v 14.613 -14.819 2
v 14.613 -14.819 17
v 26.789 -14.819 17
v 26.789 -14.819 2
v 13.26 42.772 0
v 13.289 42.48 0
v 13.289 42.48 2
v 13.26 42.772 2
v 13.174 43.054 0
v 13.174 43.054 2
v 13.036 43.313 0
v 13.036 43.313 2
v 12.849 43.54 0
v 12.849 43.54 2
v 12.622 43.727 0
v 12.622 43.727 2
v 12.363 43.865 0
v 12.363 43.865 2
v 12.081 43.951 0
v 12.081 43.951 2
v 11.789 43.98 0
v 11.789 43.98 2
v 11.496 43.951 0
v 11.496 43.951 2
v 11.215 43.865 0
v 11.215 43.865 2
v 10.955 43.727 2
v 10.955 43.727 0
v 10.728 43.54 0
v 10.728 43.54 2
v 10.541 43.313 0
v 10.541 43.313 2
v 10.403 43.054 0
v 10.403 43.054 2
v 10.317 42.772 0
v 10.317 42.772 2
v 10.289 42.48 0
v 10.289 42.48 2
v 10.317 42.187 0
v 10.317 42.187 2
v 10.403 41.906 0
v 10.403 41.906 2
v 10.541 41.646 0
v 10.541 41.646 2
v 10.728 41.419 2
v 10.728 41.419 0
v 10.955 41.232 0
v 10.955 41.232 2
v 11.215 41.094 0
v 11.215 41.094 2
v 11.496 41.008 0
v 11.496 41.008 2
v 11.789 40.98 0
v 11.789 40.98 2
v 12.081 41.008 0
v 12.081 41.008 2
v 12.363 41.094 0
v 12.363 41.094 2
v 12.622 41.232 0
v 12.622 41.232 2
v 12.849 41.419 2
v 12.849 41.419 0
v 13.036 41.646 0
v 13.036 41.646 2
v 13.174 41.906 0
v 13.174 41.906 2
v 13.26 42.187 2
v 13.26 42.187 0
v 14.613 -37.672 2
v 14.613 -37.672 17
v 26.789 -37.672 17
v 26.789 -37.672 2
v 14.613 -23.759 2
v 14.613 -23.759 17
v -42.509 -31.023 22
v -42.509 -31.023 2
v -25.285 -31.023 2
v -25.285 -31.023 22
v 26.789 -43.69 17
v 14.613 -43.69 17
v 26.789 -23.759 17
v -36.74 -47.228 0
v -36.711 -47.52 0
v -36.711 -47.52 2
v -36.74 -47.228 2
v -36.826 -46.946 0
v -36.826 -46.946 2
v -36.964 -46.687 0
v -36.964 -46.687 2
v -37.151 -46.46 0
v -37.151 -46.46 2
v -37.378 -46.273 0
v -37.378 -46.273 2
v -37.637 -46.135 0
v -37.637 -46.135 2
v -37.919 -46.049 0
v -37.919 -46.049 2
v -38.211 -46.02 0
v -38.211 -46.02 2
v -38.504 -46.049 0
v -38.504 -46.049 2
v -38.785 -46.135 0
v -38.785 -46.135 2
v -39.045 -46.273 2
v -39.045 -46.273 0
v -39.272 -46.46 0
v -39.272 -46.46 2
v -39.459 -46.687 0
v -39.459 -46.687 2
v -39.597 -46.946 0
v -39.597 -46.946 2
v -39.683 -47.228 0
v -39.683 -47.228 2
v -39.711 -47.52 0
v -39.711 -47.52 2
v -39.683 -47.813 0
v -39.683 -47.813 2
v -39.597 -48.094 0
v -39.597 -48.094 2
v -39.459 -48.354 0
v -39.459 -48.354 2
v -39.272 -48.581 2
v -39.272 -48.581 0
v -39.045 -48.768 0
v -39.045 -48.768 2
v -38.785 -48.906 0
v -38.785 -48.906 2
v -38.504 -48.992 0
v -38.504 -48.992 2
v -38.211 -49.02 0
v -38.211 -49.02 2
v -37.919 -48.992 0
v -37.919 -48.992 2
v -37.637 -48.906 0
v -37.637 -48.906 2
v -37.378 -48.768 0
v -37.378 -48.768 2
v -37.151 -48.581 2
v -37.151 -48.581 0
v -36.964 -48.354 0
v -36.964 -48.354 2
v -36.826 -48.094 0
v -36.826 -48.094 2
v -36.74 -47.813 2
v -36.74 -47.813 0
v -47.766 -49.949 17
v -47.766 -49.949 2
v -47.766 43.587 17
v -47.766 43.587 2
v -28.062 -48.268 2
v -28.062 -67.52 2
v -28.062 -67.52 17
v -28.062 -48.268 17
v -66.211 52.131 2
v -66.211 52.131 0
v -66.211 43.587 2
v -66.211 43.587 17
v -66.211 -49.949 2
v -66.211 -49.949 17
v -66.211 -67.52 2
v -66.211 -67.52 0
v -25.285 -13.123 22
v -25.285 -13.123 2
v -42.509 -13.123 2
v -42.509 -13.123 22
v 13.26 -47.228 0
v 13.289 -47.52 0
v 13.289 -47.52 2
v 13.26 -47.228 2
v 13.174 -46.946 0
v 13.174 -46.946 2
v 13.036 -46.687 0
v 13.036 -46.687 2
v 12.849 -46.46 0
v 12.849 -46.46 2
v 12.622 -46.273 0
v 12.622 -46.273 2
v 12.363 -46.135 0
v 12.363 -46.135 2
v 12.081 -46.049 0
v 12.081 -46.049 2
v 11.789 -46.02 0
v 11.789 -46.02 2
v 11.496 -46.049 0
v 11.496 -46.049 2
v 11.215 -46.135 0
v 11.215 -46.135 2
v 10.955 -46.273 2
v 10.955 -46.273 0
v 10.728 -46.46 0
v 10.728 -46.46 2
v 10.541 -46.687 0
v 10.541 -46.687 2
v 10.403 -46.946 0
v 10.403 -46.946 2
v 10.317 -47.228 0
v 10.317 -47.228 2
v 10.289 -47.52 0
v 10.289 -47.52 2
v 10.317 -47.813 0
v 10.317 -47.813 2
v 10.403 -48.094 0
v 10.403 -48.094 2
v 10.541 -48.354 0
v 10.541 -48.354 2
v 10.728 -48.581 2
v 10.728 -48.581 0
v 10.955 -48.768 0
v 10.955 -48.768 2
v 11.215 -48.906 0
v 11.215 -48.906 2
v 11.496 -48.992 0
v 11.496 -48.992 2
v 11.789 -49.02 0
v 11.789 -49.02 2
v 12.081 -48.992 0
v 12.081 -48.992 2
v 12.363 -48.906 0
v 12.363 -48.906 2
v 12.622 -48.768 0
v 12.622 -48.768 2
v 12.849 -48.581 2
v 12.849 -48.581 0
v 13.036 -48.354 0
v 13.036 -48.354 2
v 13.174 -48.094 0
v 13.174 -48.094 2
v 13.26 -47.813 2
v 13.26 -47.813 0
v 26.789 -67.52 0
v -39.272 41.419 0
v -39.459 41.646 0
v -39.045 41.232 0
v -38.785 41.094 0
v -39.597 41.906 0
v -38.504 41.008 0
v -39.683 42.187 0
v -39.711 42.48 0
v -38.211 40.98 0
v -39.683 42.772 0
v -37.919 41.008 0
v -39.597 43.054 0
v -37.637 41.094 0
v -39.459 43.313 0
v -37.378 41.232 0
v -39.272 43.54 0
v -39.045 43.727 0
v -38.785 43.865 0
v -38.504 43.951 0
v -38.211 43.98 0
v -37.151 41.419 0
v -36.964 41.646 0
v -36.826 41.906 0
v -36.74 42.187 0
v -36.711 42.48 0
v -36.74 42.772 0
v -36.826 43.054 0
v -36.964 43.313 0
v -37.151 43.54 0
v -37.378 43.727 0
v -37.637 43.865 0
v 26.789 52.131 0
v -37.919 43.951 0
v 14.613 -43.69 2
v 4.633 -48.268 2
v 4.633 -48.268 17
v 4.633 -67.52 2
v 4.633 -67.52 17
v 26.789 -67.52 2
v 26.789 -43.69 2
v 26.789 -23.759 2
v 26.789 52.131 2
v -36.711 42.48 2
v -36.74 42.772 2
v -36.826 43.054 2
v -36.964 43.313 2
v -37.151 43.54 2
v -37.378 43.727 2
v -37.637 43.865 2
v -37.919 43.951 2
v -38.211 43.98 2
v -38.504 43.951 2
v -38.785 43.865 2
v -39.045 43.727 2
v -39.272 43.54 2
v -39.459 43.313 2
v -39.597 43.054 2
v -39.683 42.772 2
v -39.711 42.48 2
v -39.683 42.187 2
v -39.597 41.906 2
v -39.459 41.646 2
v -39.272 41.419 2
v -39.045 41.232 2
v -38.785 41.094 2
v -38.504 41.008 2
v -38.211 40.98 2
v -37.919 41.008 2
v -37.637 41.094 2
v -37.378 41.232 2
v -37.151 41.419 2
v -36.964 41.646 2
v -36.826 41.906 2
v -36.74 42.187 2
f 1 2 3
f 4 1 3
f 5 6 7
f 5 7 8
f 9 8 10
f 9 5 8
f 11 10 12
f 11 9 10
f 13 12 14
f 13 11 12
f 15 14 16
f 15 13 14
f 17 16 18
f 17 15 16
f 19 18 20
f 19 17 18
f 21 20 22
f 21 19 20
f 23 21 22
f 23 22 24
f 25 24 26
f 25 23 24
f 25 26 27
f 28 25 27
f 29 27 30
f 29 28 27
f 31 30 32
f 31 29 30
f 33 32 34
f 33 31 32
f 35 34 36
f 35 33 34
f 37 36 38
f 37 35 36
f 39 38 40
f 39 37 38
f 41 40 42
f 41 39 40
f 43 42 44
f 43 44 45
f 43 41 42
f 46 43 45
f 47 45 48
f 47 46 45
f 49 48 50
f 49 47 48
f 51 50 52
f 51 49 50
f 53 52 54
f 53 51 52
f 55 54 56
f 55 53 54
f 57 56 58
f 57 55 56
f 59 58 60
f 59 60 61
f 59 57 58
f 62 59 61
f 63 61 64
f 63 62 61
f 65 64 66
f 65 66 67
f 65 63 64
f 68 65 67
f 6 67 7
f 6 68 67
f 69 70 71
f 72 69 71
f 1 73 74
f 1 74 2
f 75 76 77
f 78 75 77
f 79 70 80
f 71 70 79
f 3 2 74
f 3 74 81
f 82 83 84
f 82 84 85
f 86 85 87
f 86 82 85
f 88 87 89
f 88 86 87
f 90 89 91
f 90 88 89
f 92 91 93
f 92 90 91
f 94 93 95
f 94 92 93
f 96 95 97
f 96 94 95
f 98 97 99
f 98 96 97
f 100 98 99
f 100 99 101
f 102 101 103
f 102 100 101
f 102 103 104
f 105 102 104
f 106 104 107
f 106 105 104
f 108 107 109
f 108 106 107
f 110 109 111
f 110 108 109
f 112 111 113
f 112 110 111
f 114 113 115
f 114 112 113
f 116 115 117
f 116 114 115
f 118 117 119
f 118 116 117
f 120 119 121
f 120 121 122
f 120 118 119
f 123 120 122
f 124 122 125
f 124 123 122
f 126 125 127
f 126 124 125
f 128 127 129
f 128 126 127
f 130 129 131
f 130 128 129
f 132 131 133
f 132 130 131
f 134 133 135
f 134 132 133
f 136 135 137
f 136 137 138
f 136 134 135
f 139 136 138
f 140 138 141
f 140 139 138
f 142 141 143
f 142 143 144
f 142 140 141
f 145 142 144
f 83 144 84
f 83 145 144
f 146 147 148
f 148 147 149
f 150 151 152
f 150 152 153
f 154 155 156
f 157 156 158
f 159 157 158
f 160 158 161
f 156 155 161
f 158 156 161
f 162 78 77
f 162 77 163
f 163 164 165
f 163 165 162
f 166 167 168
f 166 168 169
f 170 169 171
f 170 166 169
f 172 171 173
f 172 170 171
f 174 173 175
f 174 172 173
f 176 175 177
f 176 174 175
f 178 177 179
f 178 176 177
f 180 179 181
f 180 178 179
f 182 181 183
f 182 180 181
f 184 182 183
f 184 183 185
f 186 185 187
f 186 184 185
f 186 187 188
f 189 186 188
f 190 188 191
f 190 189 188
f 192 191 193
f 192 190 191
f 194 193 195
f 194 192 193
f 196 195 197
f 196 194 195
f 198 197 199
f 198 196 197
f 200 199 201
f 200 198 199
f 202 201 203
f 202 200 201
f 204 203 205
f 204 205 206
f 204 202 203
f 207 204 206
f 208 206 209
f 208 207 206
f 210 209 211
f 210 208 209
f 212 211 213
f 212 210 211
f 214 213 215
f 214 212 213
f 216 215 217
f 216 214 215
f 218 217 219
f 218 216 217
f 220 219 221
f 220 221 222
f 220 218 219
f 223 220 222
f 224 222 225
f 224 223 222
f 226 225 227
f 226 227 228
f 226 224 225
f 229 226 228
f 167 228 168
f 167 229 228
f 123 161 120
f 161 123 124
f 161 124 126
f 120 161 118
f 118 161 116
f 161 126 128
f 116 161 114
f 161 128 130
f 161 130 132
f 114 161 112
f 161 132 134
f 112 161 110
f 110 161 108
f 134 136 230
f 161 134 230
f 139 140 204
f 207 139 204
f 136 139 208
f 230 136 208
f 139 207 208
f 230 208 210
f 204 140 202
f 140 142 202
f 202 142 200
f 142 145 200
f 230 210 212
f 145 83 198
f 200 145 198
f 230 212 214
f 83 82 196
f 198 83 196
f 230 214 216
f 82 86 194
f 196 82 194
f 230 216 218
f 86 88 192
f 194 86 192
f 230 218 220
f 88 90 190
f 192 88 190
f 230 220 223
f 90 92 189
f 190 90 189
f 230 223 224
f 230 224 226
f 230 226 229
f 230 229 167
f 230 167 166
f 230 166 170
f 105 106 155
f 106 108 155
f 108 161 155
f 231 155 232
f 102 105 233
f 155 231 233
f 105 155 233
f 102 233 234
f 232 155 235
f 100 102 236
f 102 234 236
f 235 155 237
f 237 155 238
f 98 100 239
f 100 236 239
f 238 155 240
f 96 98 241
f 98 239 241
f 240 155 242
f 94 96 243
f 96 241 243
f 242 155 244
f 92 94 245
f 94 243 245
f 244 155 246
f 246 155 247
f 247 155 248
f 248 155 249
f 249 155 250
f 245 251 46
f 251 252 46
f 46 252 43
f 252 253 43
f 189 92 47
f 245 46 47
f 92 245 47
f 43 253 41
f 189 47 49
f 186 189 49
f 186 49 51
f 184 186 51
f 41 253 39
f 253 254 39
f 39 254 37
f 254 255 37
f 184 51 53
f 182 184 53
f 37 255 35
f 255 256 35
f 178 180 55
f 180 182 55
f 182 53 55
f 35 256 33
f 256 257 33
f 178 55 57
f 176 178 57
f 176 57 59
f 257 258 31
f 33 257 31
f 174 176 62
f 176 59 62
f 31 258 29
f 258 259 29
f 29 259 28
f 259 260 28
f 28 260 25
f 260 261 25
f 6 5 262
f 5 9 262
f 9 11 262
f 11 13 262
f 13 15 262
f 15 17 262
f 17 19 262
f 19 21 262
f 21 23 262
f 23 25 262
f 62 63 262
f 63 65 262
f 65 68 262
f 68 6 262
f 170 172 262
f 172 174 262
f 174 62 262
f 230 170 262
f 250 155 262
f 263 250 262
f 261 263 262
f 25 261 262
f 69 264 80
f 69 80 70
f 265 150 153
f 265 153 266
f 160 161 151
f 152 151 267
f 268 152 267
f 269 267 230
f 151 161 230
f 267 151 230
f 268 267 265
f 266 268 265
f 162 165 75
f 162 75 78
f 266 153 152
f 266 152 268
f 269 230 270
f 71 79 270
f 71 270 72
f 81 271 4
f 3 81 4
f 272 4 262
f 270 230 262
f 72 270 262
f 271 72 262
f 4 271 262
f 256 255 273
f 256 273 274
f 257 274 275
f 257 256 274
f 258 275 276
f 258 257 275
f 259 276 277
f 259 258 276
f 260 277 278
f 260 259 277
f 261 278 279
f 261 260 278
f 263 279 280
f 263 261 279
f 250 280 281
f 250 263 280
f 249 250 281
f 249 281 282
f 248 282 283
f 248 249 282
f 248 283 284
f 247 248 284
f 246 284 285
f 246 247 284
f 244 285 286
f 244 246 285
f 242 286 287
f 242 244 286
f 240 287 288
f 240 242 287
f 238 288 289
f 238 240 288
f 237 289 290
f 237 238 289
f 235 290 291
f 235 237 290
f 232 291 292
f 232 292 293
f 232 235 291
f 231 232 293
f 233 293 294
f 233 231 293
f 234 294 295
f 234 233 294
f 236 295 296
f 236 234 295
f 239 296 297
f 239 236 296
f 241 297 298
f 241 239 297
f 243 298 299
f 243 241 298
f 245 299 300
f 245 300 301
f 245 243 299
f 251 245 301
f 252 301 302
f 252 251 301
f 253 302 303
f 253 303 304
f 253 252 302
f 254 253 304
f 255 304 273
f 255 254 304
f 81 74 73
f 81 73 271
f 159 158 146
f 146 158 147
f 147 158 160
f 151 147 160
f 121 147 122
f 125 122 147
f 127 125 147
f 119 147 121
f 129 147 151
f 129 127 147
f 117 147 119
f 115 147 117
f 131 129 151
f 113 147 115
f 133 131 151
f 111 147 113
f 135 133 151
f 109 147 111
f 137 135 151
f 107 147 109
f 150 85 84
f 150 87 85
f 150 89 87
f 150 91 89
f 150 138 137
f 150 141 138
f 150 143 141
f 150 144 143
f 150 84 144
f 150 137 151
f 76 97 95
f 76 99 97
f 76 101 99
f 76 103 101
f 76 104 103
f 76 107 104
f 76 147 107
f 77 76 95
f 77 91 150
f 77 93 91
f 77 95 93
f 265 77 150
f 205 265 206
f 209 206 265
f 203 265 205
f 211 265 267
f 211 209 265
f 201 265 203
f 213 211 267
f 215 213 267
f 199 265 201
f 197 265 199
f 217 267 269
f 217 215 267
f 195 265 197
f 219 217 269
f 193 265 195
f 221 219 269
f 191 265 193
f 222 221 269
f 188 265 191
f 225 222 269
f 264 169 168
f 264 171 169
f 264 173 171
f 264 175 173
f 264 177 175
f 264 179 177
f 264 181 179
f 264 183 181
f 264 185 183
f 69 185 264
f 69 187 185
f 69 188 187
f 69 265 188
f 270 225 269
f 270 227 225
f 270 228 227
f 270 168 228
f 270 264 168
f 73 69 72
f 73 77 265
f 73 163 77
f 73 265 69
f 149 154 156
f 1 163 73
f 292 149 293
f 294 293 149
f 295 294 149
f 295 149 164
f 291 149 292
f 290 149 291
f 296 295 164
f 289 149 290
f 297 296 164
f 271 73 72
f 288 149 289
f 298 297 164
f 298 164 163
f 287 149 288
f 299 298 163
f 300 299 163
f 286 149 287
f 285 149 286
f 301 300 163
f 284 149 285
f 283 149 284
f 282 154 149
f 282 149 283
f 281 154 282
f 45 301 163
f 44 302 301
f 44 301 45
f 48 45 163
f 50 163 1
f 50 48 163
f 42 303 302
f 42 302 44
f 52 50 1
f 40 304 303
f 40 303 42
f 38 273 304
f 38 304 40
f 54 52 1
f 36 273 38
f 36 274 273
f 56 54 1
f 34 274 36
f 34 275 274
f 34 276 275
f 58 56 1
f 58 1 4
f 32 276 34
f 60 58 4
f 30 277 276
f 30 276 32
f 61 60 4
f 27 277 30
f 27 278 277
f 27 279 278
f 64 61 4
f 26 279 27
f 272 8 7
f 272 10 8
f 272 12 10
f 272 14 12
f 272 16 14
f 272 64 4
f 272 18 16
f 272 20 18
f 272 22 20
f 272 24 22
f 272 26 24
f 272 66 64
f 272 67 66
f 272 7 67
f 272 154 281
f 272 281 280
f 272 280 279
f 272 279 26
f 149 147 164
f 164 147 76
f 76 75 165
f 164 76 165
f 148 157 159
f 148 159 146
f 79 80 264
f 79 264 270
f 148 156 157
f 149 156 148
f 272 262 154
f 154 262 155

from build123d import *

# Parameters (mm, degrees)
SKETCH_1_R      = 1.5
EXTRUDE_1_DEPTH = 2
SKETCH_2_W      = 18.445036106
SKETCH_2_H      = 93.536016732
SKETCH_2_W_2    = 32.694926102
SKETCH_2_H_2    = 19.252727105
SKETCH_2_W_3    = 12.175605479
SKETCH_2_H_3    = 8.939965333
SKETCH_2_H_4    = 6.01746804
EXTRUDE_2_DEPTH = 15
SKETCH_3_W      = 17.224530095
SKETCH_3_H      = 17.900793214
EXTRUDE_3_DEPTH = 20


with BuildPart() as part:
    # 草图1 → 凸台-拉伸1 (new body)
    with BuildSketch(Plane.XY):
        Polygon((-66.211382114, 42.479674797), (-66.211382114, -47.520325203), (-66.211382114, -67.520325203), (11.788617886, -67.520325203), (26.788617886, -67.520325203), (26.788617886, 42.479674797), (26.788617886, 52.131300798), (-66.211382114, 52.131300798), align=None)
        with Locations((-38.211382114, 42.479674797)):
            Circle(SKETCH_1_R, mode=Mode.SUBTRACT)
        with Locations((11.788617886, 42.479674797)):
            Circle(SKETCH_1_R, mode=Mode.SUBTRACT)
        with Locations((11.788617886, -47.520325203)):
            Circle(SKETCH_1_R, mode=Mode.SUBTRACT)
        with Locations((-38.211382114, -47.520325203)):
            Circle(SKETCH_1_R, mode=Mode.SUBTRACT)
    extrude(amount=EXTRUDE_1_DEPTH)

    # 草图2 → 凸台-拉伸2 (add)
    with BuildSketch(Plane.XY.offset(2)):
        with Locations((-56.988864061, -3.180525851)):
            Rectangle(SKETCH_2_W, SKETCH_2_H)
        with Locations((-11.714742976, -57.893961651)):
            Rectangle(SKETCH_2_W_2, SKETCH_2_H_2)
        with Locations((20.700815147, -19.289017999)):
            Rectangle(SKETCH_2_W_3, SKETCH_2_H_3)
        with Locations((20.700815147, -40.681085502)):
            Rectangle(SKETCH_2_W_3, SKETCH_2_H_4)
    extrude(amount=EXTRUDE_2_DEPTH)

    # 草图3 → 凸台-拉伸3 (add)
    with BuildSketch(Plane.XY.offset(2)):
        with Locations((-33.897142446, -22.073097892)):
            Rectangle(SKETCH_3_W, SKETCH_3_H)
    extrude(amount=EXTRUDE_3_DEPTH)


solid = part.part
